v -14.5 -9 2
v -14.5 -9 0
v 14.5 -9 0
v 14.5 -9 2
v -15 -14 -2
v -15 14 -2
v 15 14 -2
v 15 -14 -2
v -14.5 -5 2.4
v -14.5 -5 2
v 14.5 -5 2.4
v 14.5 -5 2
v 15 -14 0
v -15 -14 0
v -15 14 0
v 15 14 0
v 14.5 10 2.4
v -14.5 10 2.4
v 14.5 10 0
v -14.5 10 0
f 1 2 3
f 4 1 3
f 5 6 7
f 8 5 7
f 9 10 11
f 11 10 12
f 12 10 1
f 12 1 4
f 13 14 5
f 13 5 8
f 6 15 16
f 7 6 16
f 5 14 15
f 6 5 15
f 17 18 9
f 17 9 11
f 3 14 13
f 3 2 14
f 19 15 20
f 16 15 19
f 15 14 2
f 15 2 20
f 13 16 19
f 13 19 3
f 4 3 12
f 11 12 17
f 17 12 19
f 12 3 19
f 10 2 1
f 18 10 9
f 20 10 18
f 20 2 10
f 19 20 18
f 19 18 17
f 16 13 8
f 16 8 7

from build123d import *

# Parameters (mm, degrees)
SKETCH_1_W      = 30
SKETCH_1_H      = 28
EXTRUDE_1_DEPTH = 2
SKETCH_2_W      = 29
SKETCH_2_H      = 19
EXTRUDE_2_DEPTH = 2
SKETCH_3_W      = 29
SKETCH_3_H      = 15
EXTRUDE_3_DEPTH = 2.4


with BuildPart() as part:
    # 草图1 → 凸台-拉伸1 (new body)
    with BuildSketch(Plane.XY):
        Rectangle(SKETCH_1_W, SKETCH_1_H)
    extrude(amount=-EXTRUDE_1_DEPTH)

    # 草图2 → 凸台-拉伸2 (add)
    with BuildSketch(Plane.XY):
        with Locations((0, 0.5)):
            Rectangle(SKETCH_2_W, SKETCH_2_H)
    extrude(amount=EXTRUDE_2_DEPTH)

    # 草图3 → 凸台-拉伸3 (add)
    with BuildSketch(Plane.XY):
        with Locations((0, 2.5)):
            Rectangle(SKETCH_3_W, SKETCH_3_H)
    extrude(amount=EXTRUDE_3_DEPTH)


solid = part.part
